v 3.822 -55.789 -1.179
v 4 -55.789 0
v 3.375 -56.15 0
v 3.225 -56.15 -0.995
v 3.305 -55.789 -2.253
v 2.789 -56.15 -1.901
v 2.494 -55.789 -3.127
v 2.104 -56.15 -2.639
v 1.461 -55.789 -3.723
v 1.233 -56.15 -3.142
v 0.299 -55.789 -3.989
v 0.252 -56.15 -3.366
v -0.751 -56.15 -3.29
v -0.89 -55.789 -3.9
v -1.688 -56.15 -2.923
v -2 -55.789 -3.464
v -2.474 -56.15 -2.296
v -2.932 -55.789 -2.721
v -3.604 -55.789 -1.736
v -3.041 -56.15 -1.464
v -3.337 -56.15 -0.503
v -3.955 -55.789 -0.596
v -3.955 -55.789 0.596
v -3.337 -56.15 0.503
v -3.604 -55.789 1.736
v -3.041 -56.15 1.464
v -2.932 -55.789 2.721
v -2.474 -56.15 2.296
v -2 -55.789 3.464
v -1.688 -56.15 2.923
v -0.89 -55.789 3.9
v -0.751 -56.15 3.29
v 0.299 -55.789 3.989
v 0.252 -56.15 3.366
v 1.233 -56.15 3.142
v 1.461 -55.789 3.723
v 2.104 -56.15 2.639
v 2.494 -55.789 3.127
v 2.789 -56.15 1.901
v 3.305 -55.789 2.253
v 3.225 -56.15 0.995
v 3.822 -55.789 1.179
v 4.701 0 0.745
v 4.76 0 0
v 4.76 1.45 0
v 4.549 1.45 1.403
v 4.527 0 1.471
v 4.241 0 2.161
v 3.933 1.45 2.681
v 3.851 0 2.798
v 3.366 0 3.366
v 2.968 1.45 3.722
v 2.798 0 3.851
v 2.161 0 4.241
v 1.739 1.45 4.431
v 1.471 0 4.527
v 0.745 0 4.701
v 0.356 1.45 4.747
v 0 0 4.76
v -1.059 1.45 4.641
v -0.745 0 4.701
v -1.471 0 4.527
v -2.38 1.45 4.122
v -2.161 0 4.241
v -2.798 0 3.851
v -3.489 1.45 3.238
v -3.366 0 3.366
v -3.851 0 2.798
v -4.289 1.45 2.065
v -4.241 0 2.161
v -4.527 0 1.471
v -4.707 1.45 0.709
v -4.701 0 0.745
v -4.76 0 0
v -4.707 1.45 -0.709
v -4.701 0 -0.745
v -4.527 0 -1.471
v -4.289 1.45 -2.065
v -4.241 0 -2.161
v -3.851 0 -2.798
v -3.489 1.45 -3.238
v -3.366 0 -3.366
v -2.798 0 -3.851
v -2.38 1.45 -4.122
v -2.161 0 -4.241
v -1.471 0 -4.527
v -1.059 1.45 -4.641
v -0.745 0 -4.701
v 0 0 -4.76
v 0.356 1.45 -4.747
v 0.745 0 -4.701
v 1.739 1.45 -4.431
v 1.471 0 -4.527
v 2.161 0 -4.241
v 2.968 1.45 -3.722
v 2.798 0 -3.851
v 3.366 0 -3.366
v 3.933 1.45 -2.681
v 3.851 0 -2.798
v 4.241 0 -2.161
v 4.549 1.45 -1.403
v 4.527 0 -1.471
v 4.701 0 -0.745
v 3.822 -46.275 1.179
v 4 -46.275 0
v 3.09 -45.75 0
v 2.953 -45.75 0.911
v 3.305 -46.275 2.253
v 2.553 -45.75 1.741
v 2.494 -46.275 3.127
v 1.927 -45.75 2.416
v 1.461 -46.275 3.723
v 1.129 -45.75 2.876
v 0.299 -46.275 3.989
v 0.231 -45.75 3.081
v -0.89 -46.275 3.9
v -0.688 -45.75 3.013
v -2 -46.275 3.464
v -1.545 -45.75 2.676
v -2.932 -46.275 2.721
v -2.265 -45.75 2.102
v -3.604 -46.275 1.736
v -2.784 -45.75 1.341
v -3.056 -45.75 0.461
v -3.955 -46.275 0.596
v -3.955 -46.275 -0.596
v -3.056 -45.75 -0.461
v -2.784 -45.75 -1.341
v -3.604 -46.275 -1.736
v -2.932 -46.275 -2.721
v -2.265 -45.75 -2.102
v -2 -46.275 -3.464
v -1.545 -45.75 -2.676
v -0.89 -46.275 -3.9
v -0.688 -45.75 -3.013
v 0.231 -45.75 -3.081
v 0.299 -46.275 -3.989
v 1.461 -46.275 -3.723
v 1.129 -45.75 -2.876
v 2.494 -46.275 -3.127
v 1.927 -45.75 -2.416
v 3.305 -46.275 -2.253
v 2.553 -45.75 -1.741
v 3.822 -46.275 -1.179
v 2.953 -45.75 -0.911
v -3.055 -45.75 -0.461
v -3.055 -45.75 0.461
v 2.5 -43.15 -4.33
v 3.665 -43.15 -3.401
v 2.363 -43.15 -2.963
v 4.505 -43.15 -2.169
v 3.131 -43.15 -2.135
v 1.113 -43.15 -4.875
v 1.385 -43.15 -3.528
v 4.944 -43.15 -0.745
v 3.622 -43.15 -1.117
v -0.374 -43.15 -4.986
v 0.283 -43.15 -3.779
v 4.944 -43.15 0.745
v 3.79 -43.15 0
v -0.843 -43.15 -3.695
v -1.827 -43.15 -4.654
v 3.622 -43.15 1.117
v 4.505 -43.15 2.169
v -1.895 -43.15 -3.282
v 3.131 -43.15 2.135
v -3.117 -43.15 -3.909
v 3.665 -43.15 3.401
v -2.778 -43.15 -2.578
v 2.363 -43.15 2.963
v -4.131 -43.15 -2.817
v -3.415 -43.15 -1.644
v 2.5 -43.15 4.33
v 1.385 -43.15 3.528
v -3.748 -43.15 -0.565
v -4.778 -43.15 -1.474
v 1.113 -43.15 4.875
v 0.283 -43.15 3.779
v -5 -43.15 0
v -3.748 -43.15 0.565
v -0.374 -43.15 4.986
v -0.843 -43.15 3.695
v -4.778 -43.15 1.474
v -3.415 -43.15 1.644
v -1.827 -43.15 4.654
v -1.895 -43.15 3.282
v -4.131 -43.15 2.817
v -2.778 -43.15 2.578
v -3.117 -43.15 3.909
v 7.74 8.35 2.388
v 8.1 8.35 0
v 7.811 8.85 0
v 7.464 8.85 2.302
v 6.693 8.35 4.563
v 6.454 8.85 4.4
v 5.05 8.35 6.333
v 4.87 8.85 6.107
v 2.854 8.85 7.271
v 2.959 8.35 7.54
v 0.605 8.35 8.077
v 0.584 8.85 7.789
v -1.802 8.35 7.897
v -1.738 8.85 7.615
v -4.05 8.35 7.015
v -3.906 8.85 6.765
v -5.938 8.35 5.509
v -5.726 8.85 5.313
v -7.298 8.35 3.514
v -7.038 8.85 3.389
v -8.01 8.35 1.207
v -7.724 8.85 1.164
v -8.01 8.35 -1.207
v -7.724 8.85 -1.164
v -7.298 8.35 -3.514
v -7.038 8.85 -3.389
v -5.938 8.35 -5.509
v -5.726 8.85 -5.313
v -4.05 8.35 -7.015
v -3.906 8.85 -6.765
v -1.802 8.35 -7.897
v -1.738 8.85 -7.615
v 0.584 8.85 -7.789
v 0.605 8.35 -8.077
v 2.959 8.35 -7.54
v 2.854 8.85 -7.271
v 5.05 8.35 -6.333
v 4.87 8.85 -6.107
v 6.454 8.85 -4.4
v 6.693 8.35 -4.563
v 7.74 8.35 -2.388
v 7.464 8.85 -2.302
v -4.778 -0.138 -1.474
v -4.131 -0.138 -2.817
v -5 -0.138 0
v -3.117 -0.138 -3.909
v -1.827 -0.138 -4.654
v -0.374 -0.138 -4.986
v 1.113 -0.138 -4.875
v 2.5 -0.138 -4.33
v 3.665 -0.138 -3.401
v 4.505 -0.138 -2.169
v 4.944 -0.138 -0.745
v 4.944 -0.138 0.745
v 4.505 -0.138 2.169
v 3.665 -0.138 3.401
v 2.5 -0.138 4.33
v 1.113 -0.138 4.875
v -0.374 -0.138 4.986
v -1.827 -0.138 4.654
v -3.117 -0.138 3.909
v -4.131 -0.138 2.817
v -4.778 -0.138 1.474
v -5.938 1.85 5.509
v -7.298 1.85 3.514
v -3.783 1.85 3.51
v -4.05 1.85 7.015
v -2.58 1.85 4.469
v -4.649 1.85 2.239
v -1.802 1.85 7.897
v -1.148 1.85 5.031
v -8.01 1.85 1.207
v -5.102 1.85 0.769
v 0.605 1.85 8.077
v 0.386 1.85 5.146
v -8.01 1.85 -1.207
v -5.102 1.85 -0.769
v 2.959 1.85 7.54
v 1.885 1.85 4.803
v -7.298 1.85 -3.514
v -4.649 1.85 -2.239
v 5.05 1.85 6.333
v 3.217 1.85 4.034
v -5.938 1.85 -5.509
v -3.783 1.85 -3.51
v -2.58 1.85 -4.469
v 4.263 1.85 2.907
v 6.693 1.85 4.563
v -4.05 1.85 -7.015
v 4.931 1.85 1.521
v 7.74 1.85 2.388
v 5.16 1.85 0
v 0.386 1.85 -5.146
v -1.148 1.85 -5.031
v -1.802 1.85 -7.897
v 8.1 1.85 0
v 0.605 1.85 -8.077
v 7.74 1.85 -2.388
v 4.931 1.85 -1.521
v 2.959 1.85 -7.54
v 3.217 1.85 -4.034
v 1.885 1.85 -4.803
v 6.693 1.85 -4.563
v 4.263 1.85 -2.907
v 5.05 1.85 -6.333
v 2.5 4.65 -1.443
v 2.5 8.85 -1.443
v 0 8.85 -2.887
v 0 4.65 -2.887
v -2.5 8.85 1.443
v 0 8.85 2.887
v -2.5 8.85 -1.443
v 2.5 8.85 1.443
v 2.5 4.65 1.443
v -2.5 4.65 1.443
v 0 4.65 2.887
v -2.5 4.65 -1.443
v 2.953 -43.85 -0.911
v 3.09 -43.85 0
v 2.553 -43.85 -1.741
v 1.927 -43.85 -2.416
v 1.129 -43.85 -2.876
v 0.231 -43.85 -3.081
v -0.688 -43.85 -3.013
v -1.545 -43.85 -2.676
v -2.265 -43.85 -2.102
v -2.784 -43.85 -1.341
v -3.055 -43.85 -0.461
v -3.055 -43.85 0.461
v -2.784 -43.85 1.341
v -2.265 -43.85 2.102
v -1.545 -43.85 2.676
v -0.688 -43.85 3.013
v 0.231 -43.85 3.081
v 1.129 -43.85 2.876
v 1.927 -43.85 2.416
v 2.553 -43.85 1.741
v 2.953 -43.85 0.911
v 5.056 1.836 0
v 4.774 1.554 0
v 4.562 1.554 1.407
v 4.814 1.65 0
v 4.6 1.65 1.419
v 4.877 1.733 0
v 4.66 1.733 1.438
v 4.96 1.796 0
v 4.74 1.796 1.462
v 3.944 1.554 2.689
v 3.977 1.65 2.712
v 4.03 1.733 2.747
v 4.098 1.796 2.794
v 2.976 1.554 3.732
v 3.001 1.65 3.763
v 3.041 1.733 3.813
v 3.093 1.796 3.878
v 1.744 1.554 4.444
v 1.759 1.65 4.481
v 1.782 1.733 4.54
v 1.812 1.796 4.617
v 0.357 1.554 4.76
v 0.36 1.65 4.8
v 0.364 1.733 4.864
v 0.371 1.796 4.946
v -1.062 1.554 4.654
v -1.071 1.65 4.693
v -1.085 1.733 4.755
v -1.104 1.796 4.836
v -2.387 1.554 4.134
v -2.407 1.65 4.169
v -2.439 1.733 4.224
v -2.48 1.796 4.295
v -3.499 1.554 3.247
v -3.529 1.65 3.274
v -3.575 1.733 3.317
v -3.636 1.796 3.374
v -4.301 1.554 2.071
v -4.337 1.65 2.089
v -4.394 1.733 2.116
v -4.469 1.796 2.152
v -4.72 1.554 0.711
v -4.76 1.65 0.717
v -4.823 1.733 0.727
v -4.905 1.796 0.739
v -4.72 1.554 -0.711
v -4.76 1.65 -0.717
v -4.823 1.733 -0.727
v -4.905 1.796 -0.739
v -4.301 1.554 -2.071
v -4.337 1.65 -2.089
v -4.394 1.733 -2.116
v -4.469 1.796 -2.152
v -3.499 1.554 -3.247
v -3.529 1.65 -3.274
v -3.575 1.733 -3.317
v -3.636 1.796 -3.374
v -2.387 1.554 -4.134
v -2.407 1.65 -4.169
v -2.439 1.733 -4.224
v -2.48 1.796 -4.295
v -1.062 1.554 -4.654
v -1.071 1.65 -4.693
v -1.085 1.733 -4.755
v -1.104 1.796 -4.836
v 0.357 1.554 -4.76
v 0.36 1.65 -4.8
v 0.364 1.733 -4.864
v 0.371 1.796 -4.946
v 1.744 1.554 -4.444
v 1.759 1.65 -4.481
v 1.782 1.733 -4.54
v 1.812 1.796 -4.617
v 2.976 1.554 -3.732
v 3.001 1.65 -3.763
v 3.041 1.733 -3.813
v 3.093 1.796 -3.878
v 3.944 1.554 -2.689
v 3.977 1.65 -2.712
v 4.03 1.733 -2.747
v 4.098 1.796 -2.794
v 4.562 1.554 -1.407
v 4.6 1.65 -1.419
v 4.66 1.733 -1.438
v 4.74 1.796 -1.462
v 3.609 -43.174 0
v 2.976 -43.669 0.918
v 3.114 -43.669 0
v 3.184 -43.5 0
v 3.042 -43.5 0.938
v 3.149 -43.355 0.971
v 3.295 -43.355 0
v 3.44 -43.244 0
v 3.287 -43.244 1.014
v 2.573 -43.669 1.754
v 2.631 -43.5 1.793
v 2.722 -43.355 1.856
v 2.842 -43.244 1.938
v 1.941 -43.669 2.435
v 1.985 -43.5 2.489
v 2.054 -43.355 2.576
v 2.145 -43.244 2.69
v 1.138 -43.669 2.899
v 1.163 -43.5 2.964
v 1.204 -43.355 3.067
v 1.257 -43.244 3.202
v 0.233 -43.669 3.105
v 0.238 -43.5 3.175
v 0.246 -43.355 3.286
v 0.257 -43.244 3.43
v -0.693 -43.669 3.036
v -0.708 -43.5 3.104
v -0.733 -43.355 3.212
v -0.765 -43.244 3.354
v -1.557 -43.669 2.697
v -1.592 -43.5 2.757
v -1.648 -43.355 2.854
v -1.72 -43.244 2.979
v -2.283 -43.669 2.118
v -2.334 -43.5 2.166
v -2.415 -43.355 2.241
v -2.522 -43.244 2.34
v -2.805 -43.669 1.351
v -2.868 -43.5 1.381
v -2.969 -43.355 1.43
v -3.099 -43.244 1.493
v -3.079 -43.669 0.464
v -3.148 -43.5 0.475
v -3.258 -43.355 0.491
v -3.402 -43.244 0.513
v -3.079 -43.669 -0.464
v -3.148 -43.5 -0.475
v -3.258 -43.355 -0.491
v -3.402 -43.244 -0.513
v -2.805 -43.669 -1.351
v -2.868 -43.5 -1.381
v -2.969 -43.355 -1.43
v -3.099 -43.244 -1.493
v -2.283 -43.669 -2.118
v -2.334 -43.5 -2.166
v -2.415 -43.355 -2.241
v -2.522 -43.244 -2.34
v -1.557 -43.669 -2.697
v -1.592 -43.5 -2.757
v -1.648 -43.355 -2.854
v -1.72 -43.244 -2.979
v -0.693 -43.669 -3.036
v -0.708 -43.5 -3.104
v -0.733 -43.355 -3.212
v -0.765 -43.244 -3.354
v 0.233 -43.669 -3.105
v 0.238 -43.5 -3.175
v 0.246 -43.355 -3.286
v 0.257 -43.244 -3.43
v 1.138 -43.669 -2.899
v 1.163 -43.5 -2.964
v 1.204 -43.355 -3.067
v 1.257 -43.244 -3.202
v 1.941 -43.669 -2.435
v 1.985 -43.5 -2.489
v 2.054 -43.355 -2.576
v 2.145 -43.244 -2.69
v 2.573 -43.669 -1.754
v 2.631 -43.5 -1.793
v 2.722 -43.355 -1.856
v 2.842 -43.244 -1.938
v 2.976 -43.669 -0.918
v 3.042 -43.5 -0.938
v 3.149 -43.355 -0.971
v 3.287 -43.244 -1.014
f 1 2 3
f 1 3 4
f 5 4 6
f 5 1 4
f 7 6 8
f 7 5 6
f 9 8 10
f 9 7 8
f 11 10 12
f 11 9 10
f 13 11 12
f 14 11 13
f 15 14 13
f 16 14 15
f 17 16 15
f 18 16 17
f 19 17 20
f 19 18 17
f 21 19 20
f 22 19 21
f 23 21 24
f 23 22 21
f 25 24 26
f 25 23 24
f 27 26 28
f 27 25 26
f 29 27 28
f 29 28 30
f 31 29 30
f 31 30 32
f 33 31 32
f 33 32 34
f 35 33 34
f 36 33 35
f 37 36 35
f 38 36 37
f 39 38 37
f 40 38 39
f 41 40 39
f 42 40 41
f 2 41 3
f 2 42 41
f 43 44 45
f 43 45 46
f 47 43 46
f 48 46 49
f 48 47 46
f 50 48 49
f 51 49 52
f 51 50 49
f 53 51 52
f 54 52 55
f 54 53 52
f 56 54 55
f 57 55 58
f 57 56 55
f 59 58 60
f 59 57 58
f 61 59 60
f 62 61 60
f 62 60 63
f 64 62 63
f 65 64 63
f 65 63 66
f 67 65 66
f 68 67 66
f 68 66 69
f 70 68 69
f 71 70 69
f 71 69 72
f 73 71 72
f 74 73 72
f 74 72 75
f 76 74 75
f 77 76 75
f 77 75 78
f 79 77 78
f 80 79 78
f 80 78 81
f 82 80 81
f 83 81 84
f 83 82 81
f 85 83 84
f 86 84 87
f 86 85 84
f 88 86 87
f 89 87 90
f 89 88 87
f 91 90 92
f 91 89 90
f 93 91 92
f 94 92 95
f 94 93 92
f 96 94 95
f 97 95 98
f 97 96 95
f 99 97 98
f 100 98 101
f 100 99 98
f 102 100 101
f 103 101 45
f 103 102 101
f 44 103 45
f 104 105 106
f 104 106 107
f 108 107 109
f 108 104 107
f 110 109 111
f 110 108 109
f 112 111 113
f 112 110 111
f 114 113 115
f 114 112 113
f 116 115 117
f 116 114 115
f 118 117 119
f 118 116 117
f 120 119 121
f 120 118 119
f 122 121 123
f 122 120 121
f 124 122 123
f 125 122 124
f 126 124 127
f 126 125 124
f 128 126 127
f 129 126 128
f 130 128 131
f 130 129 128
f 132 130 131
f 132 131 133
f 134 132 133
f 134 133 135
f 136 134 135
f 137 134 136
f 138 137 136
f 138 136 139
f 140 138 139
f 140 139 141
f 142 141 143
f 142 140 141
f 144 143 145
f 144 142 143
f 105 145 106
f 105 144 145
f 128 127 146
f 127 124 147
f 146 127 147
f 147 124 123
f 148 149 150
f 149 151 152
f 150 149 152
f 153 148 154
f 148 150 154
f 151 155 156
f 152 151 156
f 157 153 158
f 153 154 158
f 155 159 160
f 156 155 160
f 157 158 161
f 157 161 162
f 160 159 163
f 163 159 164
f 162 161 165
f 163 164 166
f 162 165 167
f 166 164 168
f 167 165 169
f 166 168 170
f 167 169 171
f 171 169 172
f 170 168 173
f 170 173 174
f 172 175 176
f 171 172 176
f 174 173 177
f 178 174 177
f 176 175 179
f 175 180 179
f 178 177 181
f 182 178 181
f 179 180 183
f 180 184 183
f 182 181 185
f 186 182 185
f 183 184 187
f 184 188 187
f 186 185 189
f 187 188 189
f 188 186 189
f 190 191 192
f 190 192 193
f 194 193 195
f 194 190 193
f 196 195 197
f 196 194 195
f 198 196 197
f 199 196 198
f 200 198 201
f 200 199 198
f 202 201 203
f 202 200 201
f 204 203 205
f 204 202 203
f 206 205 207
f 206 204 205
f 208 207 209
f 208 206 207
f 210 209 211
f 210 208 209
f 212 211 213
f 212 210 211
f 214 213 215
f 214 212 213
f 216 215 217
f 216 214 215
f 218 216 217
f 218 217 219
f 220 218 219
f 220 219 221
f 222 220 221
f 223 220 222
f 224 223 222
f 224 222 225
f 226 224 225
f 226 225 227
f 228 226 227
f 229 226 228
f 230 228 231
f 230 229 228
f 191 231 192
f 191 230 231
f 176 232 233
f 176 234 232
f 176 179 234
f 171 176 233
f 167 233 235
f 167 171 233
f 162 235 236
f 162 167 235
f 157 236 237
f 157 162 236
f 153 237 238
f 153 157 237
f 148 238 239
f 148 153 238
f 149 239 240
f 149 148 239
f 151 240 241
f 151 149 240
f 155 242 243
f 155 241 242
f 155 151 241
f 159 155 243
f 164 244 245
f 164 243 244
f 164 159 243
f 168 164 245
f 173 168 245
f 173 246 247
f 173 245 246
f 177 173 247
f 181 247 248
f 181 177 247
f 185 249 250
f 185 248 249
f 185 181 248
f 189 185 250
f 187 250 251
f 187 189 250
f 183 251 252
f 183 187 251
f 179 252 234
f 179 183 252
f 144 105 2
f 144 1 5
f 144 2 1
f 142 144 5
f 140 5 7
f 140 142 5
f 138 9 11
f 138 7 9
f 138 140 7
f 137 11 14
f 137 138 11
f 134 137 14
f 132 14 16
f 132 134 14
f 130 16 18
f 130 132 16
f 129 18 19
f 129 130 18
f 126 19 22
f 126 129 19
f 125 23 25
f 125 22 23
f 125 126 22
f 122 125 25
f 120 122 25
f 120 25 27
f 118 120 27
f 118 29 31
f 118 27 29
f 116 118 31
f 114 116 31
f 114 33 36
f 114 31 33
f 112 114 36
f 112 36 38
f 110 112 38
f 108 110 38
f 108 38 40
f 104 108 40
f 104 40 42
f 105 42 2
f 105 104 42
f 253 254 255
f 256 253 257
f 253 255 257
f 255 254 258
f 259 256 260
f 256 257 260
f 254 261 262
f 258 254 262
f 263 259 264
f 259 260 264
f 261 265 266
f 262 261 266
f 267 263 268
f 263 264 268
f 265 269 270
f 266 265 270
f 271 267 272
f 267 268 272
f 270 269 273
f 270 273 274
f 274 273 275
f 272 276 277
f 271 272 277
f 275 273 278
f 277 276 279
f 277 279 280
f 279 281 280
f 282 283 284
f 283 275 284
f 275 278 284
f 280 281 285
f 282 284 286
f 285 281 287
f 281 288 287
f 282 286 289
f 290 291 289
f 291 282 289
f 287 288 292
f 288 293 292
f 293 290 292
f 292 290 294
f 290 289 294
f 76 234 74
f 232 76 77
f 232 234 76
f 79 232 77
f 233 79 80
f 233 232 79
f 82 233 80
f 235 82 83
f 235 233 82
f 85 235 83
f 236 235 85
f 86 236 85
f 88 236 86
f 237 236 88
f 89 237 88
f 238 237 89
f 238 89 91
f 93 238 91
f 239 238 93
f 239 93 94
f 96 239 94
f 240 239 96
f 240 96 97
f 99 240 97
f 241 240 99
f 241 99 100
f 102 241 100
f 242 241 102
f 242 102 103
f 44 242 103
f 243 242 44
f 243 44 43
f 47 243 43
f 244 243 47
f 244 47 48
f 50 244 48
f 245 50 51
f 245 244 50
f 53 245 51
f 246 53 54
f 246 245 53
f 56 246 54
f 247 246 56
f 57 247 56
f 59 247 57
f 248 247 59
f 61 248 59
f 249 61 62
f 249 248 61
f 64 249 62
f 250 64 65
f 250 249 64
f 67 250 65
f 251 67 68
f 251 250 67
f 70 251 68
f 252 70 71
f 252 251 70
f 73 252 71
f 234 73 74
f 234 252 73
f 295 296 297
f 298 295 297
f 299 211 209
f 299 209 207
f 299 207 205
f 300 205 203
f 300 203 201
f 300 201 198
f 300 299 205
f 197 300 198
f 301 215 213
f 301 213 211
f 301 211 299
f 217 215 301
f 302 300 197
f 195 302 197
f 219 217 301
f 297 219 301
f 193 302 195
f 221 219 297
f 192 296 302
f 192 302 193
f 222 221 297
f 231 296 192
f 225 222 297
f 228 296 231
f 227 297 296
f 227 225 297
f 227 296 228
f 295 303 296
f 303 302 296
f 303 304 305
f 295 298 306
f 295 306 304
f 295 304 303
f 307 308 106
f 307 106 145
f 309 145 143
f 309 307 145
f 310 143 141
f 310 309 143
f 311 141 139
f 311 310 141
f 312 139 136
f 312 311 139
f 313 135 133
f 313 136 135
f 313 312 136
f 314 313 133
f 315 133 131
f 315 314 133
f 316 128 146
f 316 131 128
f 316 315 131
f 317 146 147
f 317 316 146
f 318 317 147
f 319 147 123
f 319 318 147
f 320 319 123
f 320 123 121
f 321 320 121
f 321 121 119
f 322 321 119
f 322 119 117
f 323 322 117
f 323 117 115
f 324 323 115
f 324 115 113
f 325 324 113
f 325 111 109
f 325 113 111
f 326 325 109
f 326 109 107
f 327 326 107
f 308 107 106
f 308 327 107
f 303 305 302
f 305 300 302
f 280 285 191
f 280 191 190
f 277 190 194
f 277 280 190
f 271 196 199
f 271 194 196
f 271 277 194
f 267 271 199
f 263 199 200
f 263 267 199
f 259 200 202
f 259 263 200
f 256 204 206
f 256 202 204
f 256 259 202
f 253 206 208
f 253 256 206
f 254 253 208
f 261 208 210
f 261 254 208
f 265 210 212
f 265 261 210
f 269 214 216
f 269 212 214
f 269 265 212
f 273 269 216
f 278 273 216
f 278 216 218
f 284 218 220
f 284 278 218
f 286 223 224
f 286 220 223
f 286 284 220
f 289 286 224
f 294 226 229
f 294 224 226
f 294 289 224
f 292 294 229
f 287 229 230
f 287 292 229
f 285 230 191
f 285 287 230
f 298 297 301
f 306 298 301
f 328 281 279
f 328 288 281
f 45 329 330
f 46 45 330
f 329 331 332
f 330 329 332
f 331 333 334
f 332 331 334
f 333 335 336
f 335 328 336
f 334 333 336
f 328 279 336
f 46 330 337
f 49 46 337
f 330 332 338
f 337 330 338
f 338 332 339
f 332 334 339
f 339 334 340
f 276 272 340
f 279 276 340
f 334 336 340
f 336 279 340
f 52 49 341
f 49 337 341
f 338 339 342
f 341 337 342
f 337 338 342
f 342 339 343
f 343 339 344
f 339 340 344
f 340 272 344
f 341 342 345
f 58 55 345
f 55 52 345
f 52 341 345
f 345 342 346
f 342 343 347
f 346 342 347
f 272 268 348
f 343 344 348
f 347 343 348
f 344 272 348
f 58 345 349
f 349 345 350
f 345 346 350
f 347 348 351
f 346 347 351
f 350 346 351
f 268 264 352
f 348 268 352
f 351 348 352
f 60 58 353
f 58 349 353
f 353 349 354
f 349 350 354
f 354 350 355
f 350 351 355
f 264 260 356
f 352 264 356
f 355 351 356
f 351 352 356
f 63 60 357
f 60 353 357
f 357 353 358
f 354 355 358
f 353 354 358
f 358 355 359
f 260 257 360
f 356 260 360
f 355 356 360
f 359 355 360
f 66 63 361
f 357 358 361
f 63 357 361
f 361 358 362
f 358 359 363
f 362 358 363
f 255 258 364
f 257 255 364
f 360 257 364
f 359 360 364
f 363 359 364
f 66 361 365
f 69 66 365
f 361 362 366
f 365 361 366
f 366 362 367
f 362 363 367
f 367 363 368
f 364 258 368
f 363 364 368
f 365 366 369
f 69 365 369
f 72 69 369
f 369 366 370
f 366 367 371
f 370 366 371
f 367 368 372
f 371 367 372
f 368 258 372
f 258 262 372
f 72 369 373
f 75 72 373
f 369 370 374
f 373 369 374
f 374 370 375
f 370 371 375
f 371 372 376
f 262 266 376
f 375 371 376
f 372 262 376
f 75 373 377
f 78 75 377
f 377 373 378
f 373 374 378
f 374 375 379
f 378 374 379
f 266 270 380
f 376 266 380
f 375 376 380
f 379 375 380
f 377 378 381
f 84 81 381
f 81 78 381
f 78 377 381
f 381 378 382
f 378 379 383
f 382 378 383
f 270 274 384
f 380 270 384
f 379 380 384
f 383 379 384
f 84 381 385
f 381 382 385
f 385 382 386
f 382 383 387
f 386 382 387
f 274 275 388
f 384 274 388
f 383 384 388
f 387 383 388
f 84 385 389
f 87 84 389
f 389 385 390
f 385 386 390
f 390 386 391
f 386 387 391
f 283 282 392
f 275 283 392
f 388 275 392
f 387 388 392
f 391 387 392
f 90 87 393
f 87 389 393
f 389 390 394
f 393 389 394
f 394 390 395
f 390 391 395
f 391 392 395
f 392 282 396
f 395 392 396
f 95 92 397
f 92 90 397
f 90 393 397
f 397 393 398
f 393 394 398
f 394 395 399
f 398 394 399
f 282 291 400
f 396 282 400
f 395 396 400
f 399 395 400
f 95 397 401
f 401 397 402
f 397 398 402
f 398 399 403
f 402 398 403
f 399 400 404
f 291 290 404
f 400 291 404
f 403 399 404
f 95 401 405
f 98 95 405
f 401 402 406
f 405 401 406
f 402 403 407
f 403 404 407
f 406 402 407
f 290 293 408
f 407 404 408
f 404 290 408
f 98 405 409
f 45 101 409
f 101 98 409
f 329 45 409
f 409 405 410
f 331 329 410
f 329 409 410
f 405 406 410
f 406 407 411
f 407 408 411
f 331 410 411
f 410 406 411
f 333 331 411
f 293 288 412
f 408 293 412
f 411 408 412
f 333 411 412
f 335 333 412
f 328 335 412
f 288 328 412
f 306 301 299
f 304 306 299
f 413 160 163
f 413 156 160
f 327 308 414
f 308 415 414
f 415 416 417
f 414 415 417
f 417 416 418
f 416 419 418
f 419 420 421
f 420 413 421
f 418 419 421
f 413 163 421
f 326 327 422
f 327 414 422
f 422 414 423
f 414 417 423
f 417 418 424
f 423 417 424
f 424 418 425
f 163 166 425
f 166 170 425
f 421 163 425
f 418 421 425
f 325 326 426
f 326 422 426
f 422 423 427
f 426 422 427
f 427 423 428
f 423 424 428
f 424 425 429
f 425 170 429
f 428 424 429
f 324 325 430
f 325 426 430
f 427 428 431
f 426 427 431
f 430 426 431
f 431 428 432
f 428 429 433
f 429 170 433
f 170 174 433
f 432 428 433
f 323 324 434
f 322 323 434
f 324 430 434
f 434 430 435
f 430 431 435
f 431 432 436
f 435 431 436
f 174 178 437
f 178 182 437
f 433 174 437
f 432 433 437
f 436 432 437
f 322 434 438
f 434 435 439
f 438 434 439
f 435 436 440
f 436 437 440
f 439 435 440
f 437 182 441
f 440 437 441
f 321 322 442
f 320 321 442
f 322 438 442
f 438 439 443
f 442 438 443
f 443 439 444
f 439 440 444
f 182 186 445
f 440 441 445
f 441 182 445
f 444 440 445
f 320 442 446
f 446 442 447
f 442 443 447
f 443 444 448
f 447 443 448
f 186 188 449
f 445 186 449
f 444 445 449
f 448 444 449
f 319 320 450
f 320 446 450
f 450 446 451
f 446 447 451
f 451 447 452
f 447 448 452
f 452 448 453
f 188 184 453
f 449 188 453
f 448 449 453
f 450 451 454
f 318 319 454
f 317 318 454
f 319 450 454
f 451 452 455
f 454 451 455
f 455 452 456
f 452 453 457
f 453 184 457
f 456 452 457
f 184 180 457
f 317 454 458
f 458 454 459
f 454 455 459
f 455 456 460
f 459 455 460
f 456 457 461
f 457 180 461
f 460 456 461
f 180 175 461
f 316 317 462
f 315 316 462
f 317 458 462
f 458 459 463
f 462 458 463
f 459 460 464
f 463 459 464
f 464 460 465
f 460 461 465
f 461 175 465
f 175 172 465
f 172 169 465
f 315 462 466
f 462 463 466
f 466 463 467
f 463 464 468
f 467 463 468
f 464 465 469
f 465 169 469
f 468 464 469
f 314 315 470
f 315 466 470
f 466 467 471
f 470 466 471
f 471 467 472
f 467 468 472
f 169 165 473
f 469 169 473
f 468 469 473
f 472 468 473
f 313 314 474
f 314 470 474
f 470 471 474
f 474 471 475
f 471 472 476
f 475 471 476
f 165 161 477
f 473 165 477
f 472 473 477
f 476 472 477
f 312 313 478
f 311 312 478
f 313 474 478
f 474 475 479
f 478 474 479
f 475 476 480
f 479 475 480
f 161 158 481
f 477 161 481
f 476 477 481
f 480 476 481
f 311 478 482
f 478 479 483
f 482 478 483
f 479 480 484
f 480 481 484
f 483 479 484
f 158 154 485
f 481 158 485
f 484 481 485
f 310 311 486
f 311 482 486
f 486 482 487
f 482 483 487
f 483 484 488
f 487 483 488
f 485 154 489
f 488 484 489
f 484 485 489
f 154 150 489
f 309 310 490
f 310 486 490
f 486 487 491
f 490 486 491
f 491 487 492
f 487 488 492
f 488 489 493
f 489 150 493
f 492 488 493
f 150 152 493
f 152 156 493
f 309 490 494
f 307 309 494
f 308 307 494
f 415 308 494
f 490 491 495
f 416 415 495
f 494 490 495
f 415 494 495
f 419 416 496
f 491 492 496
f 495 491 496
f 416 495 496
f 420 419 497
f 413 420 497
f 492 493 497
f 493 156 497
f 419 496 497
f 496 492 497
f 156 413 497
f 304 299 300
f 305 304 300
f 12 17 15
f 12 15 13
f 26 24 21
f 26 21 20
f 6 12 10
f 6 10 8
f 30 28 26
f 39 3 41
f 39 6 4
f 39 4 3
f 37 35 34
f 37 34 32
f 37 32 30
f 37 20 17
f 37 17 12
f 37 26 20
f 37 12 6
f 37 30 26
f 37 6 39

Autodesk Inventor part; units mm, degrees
ref_plane "YZ Plane" through (0, 0, 0) normal (1, 0, 0) x (0, 1, 0)
ref_plane "XZ Plane" through (0, 0, 0) normal (0, 1, 0) x (-1, 0, 0)
ref_plane "XY Plane" through (0, 0, 0) normal (0, 0, 1) x (1, 0, 0)
sketch "Sketch1" plane through (0, 0, 0) normal (0, 0, 1) x (1, 0, 0)
  line L0 (0, 0) -> (-5, 0)
  line L1 (-5, 0) -> (-5, -43.15)
  line L2 (-5, -43.15) -> (0, -43.15)
  line L3 (0, -43.15) -> (0, 0)
  line L4 (0, 0) -> (-13.1356, 0) construction
  dimension "d1" = 43.15
  dimension "d2" = 5
revolve "Shoulder" add sketch "Sketch1" angle 360 about axis through (0, -43.15, 0) along (0, 1, 0)
sketch "Sketch2" plane through (0, 0, 0) normal (0, 1, 0) x (1, 0, 0)
  circle A0 centre (0, 0) radius 5 projected
  circle A1 centre (0, 0) radius 4.76
  dimension "d3" = 9.52
extrude "Shoulder_neck" add sketch "Sketch2" along normal blind 1.85 contours A1
sketch "Sketch3" plane through (0, 1.85, 0) normal (0, 1, 0) x (1, 0, 0)
  circle A0 centre (0, 0) radius 4.76 projected
  circle A1 centre (0, 0) radius 8.1
  dimension "d6" = 16.2
extrude "Head" add sketch "Sketch3" along normal blind 7 contours A0 | A1
sketch "Sketch4" plane through (0, -43.15, 0) normal (0, -1, 0) x (1, 0, 0)
  circle A0 centre (0, 0) radius 5 projected
  circle A1 centre (0, 0) radius 3.09
  dimension "d9" = 6.18
extrude "Thread_neck" add sketch "Sketch4" along normal blind 2.6 contours A1
sketch "Sketch5" plane through (0, -45.75, 0) normal (0, -1, 0) x (1, 0, 0)
  circle A0 centre (0, 0) radius 3.09 projected
  circle A1 centre (0, 0) radius 4
  dimension "d12" = 8
extrude "Thread_shoulder" add sketch "Sketch5" along normal blind 10.4 contours A0 | A1
sketch "Sketch6" plane through (0, 8.85, 0) normal (0, 1, 0) x (1, 0, 0)
  circle A0 centre (0, 0) radius 8.1 projected
  circle A1 centre (0, 0) radius 2.5 construction
  line L0 (-2.5, 1.4434) -> (-2.5, -1.4434)
  line L1 (-2.5, -1.4434) -> (0, -2.8868)
  line L2 (0, -2.8868) -> (2.5, -1.4434)
  line L3 (2.5, -1.4434) -> (2.5, 1.4434)
  line L4 (2.5, 1.4434) -> (0, 2.8868)
  line L5 (0, 2.8868) -> (-2.5, 1.4434)
  dimension "d15" = 5
extrude "Hex" cut sketch "Sketch6" against normal blind 4.2 contours L5 L4 L3 L2 L1 L0
chamfer "Chamfer1" distance 0.24 angle 30 1 edges at (5, 0, 0) measured on face at (-4.8255, 0, -0.7786)
fillet "Fillet1" radius 0.4 1 edges at (-4.76, 1.85, 0)
chamfer "Chamfer2" distance 0.5 angle 30 1 edges at (-8.1, 8.85, 0) measured on face at (7.9951, 6.5167, 1.2993)
chamfer "Chamfer3" distance 0.625 angle 30 1 edges at (-4, -56.15, 0) measured on face at (0.7574, -56.15, 1.0973)
fillet "Fillet2" radius 0.7 1 edges at (-3.09, -43.15, 0)
chamfer "Chamfer7" distance 0.91 angle 30 1 edges at (-4, -45.75, 0) measured on face at (3.6579, -45.75, -0.3191)
thread "Thread" size "M8x1.25" class "6g" standard "ANSI Metric M Profile" full length
equation "\"d3\" = Shoulder_neck_dia"
equation "\"d4\" = Shoulder_neck_length"
equation "\"d6\" = Head_diameter"
equation "\"d7\" = Head_height"
equation "\"d9\" = Thread_neck_dia"
equation "\"d10\" = Thread_neck_length"
equation "\"d12\" = Thread_diameter"
equation "\"d13\" = Thread_length - Thread_neck_length"
equation "\"d15\" = Hex_size"
equation "\"d16\" = Hex_length"
equation "\"d18\" = -0.5 * Shoulder_neck_dia + 0.5 * Shoulder_diameter"
equation "\"d64\" = -0.5 * Shoulder_neck_dia + 0.5 * Shoulder_diameter"
equation "\"d21\" = 0.1 * Hex_size"
equation "\"d65\" = 0.1 * Hex_size"
equation "\"d23\" = 0.5 * Thread_pitch"
equation "\"d66\" = 0.5 * Thread_pitch"
equation "\"d25\" = Thread_neck_radius"
equation "\"d60\" = -0.5 * Thread_neck_dia + 0.5 * Thread_diameter"
equation "\"d67\" = -0.5 * Thread_neck_dia + 0.5 * Thread_diameter"
equation "\"d1\" = Shoulder_length - Shoulder_neck_length"
equation "\"d2\" = 0.5 * Shoulder_diameter"
equation "\"Shoulder_length\" = 45"
equation "\"Shoulder_neck_dia\" = 9.52"
equation "\"Thread_diameter\" = 8"
equation "\"Thread_length\" = 13"
equation "\"Head_diameter\" = 16.2"
equation "\"Head_height\" = 7"
equation "\"Thread_neck_dia\" = 6.18"
equation "\"Hex_size\" = 5"
equation "\"Hex_length\" = 4.2"
equation "\"Thread_pitch\" = 1.25"
equation "\"Shoulder_neck_length\" = 1.85"
equation "\"Thread_neck_length\" = 2.6"
equation "\"Thread_neck_radius\" = 0.7"
equation "\"Shoulder_diameter\" = 10"
properties part number "SCREW, SHOULDER, P, 12" material "Steel, High Strength Low Alloy"
